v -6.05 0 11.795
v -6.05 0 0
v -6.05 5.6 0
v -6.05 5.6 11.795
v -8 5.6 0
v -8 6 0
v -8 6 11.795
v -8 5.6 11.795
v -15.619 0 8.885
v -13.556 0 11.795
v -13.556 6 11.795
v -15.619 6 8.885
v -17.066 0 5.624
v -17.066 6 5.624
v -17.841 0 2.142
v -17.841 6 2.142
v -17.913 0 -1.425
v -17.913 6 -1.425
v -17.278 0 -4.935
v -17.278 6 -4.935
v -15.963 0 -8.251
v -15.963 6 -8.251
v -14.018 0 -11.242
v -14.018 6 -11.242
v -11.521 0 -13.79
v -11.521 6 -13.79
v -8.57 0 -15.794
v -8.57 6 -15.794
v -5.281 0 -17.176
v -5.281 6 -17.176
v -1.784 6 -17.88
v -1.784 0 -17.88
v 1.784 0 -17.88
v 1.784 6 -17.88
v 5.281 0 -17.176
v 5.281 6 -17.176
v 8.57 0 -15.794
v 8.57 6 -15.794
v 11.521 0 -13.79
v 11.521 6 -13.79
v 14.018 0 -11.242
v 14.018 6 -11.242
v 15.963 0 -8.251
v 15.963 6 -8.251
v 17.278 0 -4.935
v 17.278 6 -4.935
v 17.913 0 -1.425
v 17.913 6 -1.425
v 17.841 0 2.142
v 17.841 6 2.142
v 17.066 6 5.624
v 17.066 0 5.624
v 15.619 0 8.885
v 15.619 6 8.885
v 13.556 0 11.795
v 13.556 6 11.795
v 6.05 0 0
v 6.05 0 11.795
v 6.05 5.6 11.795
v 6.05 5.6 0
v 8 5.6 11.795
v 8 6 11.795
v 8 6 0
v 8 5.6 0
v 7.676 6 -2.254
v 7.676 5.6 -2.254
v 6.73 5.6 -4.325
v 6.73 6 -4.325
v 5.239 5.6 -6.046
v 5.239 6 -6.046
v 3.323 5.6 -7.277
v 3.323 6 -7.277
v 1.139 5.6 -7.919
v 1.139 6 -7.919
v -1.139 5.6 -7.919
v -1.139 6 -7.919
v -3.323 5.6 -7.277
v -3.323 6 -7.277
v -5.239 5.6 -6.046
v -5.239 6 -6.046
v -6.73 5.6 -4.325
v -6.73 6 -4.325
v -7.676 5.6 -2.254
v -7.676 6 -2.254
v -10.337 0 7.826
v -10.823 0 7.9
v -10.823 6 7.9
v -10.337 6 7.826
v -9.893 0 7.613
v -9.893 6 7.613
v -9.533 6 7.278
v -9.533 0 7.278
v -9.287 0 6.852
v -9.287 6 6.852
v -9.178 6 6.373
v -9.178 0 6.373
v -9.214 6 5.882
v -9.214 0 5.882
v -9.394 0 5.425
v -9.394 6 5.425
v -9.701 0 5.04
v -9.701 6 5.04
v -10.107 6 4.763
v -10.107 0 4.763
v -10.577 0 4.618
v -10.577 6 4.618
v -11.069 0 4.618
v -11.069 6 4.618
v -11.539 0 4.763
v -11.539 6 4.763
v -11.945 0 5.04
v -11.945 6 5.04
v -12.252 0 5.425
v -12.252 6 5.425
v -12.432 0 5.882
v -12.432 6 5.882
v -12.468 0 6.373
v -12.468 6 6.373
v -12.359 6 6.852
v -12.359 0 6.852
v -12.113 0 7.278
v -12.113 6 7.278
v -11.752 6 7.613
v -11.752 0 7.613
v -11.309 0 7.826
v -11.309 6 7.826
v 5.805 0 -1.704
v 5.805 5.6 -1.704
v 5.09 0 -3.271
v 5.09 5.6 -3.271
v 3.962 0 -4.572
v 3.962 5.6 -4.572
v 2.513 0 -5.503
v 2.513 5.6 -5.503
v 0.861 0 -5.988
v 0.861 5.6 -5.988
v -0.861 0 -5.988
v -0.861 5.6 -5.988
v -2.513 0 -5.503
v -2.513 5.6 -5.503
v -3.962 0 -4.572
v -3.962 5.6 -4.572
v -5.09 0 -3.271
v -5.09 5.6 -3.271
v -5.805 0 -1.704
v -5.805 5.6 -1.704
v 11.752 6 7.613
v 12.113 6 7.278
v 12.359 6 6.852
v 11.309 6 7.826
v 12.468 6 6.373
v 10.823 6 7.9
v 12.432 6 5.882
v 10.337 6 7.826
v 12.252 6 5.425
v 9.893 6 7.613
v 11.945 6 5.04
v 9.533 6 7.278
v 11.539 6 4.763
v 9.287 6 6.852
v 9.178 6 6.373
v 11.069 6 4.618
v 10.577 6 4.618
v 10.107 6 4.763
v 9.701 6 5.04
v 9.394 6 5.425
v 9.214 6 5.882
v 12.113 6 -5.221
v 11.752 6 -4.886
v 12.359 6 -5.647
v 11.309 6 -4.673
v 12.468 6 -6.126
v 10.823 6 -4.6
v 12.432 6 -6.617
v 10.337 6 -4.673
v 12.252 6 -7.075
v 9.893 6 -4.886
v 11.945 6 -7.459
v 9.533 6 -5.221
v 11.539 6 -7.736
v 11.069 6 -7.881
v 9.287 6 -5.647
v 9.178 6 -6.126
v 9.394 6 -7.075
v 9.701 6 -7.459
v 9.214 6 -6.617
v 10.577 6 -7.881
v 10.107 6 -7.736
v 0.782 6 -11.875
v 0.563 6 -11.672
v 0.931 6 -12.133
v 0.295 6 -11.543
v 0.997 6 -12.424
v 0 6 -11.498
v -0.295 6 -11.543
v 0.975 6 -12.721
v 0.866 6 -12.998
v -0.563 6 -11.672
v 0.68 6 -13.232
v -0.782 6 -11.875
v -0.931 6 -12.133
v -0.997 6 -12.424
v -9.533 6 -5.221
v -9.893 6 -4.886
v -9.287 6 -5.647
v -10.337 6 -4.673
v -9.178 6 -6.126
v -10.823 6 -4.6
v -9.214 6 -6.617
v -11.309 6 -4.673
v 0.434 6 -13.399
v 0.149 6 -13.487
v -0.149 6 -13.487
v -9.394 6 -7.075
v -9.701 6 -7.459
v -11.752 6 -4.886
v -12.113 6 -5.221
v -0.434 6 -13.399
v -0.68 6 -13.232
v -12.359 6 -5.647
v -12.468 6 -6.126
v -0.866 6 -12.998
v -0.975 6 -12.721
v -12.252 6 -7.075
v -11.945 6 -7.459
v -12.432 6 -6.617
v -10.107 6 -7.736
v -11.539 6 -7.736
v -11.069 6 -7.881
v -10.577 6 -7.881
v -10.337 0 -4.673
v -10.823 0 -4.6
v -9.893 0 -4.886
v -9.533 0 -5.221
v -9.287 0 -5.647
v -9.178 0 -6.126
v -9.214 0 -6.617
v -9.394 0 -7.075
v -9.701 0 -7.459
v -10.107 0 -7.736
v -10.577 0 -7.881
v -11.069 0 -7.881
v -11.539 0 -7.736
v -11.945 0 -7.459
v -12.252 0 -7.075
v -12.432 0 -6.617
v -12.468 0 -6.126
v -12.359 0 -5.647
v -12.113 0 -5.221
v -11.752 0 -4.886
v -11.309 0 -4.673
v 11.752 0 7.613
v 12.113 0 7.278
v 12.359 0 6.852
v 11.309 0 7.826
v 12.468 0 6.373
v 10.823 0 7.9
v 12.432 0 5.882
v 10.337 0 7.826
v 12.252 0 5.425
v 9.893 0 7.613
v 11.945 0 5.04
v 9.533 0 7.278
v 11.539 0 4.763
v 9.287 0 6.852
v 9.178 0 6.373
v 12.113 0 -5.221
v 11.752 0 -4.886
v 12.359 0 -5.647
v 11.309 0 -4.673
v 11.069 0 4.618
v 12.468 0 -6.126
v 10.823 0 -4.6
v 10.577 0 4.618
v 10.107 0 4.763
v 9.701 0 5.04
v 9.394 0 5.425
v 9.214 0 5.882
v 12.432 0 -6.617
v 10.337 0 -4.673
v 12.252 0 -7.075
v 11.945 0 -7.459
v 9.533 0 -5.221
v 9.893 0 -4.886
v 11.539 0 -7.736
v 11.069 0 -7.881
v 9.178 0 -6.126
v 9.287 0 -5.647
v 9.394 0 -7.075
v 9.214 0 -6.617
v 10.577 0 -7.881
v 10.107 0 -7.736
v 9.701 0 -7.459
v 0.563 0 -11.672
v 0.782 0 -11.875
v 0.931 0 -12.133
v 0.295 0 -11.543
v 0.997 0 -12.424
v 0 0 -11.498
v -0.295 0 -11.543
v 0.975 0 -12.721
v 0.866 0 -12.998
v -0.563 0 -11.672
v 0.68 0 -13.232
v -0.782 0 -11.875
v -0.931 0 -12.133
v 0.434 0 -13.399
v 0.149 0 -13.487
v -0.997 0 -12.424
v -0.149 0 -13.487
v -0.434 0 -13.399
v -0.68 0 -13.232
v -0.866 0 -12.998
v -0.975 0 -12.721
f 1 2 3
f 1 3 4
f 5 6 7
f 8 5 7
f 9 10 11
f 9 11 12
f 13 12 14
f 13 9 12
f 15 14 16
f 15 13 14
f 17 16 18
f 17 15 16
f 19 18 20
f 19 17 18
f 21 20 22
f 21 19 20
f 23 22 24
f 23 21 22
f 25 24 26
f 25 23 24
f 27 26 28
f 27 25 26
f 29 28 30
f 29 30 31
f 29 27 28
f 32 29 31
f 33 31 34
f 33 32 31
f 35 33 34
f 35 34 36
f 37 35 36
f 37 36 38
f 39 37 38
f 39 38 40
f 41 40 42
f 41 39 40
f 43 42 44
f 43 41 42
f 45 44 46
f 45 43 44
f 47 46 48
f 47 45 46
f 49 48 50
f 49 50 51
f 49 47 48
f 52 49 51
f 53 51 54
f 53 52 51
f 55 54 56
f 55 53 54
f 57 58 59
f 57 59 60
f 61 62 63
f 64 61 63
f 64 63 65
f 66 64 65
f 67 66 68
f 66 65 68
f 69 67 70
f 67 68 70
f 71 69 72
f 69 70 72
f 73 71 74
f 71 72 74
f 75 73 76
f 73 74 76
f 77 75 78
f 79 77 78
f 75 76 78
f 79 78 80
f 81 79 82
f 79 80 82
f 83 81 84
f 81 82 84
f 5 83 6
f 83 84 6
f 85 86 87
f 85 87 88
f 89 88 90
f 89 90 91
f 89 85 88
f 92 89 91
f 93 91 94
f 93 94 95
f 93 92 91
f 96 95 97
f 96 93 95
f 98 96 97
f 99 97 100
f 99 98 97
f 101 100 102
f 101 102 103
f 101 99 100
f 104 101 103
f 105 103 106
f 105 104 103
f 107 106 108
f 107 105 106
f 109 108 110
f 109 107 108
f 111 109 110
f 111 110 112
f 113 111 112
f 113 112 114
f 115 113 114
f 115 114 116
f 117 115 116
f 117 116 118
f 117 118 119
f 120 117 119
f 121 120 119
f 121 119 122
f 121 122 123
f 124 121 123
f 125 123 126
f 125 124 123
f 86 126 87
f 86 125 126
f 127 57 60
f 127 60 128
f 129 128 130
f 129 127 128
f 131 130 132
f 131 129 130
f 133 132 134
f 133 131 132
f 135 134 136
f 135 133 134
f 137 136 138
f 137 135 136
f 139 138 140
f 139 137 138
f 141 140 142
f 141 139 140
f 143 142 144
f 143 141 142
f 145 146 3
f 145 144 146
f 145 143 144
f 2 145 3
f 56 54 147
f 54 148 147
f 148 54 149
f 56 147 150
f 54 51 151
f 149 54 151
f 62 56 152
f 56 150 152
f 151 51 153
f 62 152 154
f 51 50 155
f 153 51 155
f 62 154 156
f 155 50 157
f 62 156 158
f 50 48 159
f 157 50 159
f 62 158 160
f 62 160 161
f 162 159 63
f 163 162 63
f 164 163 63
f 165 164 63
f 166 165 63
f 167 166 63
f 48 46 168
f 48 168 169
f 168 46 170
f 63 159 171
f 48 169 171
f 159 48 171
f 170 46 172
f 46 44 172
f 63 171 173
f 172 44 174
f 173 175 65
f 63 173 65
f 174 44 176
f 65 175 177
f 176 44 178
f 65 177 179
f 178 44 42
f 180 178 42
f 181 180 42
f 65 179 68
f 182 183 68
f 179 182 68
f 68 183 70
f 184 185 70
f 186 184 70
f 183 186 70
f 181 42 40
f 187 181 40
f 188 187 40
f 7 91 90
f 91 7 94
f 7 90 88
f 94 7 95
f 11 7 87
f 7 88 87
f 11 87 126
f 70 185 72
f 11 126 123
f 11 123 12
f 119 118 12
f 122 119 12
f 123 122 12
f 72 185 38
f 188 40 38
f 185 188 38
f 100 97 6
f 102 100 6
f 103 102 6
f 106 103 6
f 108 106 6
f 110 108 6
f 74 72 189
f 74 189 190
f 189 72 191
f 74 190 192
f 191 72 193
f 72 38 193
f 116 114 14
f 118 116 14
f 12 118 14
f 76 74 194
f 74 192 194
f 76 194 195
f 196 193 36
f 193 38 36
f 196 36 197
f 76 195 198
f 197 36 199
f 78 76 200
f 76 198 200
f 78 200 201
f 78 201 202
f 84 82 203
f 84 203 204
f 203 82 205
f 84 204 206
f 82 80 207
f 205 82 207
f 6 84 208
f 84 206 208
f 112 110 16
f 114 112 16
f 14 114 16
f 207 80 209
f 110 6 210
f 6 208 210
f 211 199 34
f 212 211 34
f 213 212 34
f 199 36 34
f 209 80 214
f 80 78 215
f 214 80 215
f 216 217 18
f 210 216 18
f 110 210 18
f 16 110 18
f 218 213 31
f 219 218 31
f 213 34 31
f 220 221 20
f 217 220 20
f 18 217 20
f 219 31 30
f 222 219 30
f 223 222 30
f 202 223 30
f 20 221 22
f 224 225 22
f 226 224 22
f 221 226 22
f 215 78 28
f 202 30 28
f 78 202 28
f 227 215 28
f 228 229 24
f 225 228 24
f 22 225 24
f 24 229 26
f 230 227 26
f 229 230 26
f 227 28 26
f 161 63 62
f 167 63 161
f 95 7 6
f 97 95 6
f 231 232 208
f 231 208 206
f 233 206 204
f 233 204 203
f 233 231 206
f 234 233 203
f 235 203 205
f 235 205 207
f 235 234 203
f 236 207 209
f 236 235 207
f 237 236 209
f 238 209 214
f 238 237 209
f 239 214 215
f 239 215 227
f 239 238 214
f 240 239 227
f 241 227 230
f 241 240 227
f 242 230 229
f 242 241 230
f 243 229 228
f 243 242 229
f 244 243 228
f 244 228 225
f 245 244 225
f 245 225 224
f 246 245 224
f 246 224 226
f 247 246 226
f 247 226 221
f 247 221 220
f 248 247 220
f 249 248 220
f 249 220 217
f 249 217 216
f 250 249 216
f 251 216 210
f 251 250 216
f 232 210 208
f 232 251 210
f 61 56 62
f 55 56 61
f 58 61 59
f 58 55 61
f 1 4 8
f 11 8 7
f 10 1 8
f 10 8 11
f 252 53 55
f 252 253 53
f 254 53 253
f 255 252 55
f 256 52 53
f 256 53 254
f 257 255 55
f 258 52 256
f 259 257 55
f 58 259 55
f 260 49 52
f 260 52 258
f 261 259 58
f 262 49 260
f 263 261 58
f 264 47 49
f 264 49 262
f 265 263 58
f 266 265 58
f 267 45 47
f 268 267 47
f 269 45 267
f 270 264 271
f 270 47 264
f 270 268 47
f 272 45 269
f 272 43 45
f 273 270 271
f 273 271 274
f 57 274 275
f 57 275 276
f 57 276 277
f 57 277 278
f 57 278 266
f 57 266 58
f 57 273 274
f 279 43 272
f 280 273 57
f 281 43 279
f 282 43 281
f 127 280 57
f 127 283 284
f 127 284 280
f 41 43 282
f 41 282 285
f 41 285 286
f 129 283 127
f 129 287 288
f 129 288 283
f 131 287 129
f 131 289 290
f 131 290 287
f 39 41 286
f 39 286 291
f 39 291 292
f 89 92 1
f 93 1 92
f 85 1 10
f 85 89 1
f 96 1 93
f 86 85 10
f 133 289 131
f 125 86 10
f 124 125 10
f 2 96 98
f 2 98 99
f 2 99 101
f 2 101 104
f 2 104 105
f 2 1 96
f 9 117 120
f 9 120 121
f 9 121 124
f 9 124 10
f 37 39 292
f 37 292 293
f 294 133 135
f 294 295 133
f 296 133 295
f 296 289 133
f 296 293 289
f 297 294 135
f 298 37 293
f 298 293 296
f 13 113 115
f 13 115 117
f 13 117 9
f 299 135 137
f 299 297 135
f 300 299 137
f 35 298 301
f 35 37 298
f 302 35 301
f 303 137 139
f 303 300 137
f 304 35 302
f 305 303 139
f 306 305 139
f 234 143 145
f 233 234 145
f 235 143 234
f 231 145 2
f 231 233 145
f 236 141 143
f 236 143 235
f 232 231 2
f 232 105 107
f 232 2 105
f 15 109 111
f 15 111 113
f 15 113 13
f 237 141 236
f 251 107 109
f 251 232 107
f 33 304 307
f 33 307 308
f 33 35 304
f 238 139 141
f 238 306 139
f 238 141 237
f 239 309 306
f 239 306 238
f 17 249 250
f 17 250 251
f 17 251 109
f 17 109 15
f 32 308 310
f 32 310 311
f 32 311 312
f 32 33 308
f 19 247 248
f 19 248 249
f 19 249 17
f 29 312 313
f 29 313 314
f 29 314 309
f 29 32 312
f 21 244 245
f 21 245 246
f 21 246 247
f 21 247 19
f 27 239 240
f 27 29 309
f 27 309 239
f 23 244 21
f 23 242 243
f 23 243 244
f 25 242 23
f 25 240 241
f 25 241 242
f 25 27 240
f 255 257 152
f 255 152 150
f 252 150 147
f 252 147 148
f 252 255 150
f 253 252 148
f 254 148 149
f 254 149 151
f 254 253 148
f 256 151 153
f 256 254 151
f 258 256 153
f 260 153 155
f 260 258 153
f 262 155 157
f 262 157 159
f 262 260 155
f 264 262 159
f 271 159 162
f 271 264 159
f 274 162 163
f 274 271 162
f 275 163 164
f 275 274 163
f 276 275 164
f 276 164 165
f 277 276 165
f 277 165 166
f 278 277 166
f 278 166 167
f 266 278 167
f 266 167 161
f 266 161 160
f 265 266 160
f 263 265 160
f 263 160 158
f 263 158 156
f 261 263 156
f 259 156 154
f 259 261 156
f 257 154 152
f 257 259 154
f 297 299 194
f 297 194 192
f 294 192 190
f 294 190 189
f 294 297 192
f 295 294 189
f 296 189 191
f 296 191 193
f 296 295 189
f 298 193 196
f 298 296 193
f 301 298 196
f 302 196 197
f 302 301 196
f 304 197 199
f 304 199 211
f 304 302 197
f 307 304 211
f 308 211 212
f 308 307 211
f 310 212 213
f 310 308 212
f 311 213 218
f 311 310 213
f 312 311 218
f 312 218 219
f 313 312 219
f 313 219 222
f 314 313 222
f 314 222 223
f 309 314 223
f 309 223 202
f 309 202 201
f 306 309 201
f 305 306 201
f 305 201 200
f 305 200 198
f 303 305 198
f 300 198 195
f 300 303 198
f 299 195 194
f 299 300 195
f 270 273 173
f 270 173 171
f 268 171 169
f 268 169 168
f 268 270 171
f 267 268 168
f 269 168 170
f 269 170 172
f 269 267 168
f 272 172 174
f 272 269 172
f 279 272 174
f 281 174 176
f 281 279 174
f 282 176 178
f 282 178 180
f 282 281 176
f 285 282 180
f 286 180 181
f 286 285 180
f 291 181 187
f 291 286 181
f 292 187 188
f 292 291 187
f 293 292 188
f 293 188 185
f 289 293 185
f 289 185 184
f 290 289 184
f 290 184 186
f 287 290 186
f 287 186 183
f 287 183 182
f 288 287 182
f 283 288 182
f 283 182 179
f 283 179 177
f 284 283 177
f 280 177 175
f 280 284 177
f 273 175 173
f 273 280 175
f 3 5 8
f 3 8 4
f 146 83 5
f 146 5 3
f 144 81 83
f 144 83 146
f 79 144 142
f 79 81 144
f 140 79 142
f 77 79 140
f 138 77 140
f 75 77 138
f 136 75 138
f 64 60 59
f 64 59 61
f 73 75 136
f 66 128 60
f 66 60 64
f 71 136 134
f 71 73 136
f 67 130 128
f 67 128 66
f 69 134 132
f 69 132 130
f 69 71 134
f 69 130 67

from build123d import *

# Parameters (mm, degrees)
SKETCH1_R           = 1.65
SKETCH1_R_2         = 1
BOSS_EXTRUDE1_DEPTH = 6
CUT_EXTRUDE1_DEPTH  = 0.4


with BuildPart() as part:
    # Sketch1 → Boss-Extrude1 (new body)
    with BuildSketch(Plane(origin=(0, 0, 0), x_dir=(1, 0, 0), z_dir=(0, 1, 0))):
        with BuildLine():
            Line((13.55616119, -11.79495), (6.05, -11.79495))
            Line((6.05, -11.79495), (6.05, 0))
            ThreePointArc((6.05, 0), (0, 6.05), (-6.05, 0))
            Line((-6.05, 0), (-6.05, -11.79495))
            Line((-6.05, -11.79495), (-13.55616119, -11.79495))
            ThreePointArc((-13.55616119, -11.79495), (0, 17.96915), (13.55616119, -11.79495))
        make_face()
        with Locations(Location((-10.82295, 6.24955, 0), (0, 0, 270))):
            Circle(SKETCH1_R, mode=Mode.SUBTRACT)
        with Locations(Location((10.82295, 6.24955, 0), (0, 0, 270))):
            Circle(SKETCH1_R, mode=Mode.SUBTRACT)
        with Locations(Location((10.82295, -6.24955, 0), (0, 0, 270))):
            Circle(SKETCH1_R, mode=Mode.SUBTRACT)
        with Locations(Location((-10.82295, -6.24955, 0), (0, 0, 270))):
            Circle(SKETCH1_R, mode=Mode.SUBTRACT)
        with Locations(Location((0, 12.4985, 0), (0, 0, 270))):
            Circle(SKETCH1_R_2, mode=Mode.SUBTRACT)
    extrude(amount=BOSS_EXTRUDE1_DEPTH)

    # Sketch2 → Cut-Extrude1 (cut)
    with BuildSketch(Plane(origin=(0, 6, 0), x_dir=(1, 0, 0), z_dir=(0, 1, 0))):
        with BuildLine():
            Line((-8, 0), (-8, -11.79495))
            Line((-8, -11.79495), (8, -11.79495))
            Line((8, -11.79495), (8, 0))
            ThreePointArc((8, 0), (0, 8), (-8, 0))
        make_face()
    extrude(amount=-CUT_EXTRUDE1_DEPTH, mode=Mode.SUBTRACT)


solid = part.part
